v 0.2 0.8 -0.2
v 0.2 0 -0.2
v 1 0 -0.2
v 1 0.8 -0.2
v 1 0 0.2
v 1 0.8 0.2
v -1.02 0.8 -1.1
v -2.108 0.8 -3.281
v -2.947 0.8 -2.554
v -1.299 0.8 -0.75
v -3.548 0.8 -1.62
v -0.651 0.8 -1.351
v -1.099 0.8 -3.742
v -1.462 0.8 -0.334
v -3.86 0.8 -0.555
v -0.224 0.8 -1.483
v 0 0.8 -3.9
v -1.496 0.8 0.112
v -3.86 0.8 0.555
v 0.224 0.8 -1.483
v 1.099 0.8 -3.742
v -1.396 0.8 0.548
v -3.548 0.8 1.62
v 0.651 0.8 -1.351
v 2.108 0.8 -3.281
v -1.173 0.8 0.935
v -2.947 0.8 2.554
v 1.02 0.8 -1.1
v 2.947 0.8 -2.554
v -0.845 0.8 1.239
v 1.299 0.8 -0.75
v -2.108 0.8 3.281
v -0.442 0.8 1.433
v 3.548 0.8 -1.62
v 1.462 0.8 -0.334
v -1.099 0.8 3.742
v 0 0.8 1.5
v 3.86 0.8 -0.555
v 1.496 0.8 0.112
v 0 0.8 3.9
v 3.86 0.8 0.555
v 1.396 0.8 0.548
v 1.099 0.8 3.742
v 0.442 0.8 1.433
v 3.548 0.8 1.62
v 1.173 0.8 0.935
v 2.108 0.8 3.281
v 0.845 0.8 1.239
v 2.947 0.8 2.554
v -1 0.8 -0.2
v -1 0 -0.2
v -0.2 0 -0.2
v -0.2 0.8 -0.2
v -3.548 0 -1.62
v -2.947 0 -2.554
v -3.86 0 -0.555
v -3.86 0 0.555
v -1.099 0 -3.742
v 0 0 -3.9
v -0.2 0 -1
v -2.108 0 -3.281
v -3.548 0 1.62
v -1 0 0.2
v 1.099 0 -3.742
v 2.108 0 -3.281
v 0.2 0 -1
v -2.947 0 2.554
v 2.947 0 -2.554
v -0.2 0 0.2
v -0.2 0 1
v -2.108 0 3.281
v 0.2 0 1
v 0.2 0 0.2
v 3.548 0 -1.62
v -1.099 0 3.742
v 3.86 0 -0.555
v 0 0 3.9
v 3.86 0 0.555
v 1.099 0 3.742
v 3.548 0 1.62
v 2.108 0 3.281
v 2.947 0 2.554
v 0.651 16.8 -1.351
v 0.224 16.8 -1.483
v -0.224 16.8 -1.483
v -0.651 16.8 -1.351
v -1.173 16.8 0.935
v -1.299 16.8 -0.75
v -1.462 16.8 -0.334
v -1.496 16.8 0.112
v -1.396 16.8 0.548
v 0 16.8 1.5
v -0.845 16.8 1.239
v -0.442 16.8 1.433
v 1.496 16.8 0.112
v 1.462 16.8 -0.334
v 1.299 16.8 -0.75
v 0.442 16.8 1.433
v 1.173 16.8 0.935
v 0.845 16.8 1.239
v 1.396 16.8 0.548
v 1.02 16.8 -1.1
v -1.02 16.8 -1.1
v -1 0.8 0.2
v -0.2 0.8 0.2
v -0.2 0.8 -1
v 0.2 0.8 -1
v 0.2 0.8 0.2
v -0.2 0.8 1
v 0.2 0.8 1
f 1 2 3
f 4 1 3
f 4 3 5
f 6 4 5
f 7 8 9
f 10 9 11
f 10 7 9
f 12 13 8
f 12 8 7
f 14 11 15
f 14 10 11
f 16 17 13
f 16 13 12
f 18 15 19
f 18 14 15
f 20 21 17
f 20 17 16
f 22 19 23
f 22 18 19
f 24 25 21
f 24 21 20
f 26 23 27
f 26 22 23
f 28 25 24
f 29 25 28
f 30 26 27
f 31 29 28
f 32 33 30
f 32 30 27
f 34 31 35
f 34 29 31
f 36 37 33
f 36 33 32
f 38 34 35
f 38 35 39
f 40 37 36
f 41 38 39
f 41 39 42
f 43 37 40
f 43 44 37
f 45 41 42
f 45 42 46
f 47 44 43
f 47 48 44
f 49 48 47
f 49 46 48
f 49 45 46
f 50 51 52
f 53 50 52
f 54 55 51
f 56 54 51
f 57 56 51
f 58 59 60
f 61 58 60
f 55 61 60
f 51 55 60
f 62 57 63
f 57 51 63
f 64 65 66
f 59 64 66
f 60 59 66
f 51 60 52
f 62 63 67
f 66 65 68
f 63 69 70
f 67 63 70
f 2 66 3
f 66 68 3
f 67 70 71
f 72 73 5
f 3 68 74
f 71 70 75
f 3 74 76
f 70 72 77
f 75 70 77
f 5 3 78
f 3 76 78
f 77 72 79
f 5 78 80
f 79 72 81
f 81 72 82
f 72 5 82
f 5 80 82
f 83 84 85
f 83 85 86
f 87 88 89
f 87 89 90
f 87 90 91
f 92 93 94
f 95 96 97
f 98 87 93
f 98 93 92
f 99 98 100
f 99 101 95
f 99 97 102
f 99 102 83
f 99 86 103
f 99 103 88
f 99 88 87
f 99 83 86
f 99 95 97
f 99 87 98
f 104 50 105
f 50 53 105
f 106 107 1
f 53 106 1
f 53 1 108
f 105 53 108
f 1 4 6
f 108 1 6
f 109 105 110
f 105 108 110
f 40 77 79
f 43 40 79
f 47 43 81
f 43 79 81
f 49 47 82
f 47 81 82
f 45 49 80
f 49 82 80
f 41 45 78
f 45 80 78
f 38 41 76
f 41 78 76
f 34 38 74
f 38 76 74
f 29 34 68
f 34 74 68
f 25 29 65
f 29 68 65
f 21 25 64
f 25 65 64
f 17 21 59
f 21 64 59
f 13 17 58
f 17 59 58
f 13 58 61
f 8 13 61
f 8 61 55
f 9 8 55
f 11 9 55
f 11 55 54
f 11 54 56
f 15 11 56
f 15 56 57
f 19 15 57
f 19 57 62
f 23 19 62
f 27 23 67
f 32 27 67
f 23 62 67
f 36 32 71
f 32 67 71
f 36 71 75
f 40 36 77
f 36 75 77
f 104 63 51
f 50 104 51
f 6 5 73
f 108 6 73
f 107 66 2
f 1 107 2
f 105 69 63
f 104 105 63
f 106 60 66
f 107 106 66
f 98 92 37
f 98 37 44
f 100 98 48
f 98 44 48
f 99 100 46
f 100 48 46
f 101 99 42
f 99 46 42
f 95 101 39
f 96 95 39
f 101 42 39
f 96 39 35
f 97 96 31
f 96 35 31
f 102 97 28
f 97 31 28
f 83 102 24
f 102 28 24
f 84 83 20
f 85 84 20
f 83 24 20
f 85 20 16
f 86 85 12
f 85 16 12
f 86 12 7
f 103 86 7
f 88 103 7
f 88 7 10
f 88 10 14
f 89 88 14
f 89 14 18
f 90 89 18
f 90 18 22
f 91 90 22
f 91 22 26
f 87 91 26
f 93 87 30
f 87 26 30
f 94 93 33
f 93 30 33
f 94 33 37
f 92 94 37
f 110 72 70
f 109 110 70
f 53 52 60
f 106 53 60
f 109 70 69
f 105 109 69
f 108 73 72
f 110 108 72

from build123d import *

# Parameters (mm, degrees)
SKETCH_1_R      = 3.9
EXTRUDE_1_DEPTH = 0.8
SKETCH_2_R      = 1.5
EXTRUDE_4_DEPTH = 16


with BuildPart() as part:
    # 草图1 → 凸台-拉伸1 (new body)
    with BuildSketch(Plane(origin=(0, 0, 0), x_dir=(1, 0, 0), z_dir=(0, 1, 0))):
        with Locations(Location((0, 0, 0), (0, 0, 270))):
            Circle(SKETCH_1_R)
        Polygon((-1, 0), (-1, 0.2), (-0.2, 0.2), (-0.2, 1), (0, 1), (0.2, 1), (0.2, 0.2), (1, 0.2), (1, 0), (1, -0.2), (0.2, -0.2), (0.2, -1), (0, -1), (-0.2, -1), (-0.2, -0.2), (-1, -0.2), align=None, mode=Mode.SUBTRACT)
    extrude(amount=EXTRUDE_1_DEPTH)

    # 草图2 → 凸台-拉伸4 (add)
    with BuildSketch(Plane(origin=(0, 0.8, 0), x_dir=(1, 0, 0), z_dir=(0, 1, 0))):
        with Locations(Location((0, 0, 0), (0, 0, 270))):
            Circle(SKETCH_2_R)
    extrude(amount=EXTRUDE_4_DEPTH)


solid = part.part
